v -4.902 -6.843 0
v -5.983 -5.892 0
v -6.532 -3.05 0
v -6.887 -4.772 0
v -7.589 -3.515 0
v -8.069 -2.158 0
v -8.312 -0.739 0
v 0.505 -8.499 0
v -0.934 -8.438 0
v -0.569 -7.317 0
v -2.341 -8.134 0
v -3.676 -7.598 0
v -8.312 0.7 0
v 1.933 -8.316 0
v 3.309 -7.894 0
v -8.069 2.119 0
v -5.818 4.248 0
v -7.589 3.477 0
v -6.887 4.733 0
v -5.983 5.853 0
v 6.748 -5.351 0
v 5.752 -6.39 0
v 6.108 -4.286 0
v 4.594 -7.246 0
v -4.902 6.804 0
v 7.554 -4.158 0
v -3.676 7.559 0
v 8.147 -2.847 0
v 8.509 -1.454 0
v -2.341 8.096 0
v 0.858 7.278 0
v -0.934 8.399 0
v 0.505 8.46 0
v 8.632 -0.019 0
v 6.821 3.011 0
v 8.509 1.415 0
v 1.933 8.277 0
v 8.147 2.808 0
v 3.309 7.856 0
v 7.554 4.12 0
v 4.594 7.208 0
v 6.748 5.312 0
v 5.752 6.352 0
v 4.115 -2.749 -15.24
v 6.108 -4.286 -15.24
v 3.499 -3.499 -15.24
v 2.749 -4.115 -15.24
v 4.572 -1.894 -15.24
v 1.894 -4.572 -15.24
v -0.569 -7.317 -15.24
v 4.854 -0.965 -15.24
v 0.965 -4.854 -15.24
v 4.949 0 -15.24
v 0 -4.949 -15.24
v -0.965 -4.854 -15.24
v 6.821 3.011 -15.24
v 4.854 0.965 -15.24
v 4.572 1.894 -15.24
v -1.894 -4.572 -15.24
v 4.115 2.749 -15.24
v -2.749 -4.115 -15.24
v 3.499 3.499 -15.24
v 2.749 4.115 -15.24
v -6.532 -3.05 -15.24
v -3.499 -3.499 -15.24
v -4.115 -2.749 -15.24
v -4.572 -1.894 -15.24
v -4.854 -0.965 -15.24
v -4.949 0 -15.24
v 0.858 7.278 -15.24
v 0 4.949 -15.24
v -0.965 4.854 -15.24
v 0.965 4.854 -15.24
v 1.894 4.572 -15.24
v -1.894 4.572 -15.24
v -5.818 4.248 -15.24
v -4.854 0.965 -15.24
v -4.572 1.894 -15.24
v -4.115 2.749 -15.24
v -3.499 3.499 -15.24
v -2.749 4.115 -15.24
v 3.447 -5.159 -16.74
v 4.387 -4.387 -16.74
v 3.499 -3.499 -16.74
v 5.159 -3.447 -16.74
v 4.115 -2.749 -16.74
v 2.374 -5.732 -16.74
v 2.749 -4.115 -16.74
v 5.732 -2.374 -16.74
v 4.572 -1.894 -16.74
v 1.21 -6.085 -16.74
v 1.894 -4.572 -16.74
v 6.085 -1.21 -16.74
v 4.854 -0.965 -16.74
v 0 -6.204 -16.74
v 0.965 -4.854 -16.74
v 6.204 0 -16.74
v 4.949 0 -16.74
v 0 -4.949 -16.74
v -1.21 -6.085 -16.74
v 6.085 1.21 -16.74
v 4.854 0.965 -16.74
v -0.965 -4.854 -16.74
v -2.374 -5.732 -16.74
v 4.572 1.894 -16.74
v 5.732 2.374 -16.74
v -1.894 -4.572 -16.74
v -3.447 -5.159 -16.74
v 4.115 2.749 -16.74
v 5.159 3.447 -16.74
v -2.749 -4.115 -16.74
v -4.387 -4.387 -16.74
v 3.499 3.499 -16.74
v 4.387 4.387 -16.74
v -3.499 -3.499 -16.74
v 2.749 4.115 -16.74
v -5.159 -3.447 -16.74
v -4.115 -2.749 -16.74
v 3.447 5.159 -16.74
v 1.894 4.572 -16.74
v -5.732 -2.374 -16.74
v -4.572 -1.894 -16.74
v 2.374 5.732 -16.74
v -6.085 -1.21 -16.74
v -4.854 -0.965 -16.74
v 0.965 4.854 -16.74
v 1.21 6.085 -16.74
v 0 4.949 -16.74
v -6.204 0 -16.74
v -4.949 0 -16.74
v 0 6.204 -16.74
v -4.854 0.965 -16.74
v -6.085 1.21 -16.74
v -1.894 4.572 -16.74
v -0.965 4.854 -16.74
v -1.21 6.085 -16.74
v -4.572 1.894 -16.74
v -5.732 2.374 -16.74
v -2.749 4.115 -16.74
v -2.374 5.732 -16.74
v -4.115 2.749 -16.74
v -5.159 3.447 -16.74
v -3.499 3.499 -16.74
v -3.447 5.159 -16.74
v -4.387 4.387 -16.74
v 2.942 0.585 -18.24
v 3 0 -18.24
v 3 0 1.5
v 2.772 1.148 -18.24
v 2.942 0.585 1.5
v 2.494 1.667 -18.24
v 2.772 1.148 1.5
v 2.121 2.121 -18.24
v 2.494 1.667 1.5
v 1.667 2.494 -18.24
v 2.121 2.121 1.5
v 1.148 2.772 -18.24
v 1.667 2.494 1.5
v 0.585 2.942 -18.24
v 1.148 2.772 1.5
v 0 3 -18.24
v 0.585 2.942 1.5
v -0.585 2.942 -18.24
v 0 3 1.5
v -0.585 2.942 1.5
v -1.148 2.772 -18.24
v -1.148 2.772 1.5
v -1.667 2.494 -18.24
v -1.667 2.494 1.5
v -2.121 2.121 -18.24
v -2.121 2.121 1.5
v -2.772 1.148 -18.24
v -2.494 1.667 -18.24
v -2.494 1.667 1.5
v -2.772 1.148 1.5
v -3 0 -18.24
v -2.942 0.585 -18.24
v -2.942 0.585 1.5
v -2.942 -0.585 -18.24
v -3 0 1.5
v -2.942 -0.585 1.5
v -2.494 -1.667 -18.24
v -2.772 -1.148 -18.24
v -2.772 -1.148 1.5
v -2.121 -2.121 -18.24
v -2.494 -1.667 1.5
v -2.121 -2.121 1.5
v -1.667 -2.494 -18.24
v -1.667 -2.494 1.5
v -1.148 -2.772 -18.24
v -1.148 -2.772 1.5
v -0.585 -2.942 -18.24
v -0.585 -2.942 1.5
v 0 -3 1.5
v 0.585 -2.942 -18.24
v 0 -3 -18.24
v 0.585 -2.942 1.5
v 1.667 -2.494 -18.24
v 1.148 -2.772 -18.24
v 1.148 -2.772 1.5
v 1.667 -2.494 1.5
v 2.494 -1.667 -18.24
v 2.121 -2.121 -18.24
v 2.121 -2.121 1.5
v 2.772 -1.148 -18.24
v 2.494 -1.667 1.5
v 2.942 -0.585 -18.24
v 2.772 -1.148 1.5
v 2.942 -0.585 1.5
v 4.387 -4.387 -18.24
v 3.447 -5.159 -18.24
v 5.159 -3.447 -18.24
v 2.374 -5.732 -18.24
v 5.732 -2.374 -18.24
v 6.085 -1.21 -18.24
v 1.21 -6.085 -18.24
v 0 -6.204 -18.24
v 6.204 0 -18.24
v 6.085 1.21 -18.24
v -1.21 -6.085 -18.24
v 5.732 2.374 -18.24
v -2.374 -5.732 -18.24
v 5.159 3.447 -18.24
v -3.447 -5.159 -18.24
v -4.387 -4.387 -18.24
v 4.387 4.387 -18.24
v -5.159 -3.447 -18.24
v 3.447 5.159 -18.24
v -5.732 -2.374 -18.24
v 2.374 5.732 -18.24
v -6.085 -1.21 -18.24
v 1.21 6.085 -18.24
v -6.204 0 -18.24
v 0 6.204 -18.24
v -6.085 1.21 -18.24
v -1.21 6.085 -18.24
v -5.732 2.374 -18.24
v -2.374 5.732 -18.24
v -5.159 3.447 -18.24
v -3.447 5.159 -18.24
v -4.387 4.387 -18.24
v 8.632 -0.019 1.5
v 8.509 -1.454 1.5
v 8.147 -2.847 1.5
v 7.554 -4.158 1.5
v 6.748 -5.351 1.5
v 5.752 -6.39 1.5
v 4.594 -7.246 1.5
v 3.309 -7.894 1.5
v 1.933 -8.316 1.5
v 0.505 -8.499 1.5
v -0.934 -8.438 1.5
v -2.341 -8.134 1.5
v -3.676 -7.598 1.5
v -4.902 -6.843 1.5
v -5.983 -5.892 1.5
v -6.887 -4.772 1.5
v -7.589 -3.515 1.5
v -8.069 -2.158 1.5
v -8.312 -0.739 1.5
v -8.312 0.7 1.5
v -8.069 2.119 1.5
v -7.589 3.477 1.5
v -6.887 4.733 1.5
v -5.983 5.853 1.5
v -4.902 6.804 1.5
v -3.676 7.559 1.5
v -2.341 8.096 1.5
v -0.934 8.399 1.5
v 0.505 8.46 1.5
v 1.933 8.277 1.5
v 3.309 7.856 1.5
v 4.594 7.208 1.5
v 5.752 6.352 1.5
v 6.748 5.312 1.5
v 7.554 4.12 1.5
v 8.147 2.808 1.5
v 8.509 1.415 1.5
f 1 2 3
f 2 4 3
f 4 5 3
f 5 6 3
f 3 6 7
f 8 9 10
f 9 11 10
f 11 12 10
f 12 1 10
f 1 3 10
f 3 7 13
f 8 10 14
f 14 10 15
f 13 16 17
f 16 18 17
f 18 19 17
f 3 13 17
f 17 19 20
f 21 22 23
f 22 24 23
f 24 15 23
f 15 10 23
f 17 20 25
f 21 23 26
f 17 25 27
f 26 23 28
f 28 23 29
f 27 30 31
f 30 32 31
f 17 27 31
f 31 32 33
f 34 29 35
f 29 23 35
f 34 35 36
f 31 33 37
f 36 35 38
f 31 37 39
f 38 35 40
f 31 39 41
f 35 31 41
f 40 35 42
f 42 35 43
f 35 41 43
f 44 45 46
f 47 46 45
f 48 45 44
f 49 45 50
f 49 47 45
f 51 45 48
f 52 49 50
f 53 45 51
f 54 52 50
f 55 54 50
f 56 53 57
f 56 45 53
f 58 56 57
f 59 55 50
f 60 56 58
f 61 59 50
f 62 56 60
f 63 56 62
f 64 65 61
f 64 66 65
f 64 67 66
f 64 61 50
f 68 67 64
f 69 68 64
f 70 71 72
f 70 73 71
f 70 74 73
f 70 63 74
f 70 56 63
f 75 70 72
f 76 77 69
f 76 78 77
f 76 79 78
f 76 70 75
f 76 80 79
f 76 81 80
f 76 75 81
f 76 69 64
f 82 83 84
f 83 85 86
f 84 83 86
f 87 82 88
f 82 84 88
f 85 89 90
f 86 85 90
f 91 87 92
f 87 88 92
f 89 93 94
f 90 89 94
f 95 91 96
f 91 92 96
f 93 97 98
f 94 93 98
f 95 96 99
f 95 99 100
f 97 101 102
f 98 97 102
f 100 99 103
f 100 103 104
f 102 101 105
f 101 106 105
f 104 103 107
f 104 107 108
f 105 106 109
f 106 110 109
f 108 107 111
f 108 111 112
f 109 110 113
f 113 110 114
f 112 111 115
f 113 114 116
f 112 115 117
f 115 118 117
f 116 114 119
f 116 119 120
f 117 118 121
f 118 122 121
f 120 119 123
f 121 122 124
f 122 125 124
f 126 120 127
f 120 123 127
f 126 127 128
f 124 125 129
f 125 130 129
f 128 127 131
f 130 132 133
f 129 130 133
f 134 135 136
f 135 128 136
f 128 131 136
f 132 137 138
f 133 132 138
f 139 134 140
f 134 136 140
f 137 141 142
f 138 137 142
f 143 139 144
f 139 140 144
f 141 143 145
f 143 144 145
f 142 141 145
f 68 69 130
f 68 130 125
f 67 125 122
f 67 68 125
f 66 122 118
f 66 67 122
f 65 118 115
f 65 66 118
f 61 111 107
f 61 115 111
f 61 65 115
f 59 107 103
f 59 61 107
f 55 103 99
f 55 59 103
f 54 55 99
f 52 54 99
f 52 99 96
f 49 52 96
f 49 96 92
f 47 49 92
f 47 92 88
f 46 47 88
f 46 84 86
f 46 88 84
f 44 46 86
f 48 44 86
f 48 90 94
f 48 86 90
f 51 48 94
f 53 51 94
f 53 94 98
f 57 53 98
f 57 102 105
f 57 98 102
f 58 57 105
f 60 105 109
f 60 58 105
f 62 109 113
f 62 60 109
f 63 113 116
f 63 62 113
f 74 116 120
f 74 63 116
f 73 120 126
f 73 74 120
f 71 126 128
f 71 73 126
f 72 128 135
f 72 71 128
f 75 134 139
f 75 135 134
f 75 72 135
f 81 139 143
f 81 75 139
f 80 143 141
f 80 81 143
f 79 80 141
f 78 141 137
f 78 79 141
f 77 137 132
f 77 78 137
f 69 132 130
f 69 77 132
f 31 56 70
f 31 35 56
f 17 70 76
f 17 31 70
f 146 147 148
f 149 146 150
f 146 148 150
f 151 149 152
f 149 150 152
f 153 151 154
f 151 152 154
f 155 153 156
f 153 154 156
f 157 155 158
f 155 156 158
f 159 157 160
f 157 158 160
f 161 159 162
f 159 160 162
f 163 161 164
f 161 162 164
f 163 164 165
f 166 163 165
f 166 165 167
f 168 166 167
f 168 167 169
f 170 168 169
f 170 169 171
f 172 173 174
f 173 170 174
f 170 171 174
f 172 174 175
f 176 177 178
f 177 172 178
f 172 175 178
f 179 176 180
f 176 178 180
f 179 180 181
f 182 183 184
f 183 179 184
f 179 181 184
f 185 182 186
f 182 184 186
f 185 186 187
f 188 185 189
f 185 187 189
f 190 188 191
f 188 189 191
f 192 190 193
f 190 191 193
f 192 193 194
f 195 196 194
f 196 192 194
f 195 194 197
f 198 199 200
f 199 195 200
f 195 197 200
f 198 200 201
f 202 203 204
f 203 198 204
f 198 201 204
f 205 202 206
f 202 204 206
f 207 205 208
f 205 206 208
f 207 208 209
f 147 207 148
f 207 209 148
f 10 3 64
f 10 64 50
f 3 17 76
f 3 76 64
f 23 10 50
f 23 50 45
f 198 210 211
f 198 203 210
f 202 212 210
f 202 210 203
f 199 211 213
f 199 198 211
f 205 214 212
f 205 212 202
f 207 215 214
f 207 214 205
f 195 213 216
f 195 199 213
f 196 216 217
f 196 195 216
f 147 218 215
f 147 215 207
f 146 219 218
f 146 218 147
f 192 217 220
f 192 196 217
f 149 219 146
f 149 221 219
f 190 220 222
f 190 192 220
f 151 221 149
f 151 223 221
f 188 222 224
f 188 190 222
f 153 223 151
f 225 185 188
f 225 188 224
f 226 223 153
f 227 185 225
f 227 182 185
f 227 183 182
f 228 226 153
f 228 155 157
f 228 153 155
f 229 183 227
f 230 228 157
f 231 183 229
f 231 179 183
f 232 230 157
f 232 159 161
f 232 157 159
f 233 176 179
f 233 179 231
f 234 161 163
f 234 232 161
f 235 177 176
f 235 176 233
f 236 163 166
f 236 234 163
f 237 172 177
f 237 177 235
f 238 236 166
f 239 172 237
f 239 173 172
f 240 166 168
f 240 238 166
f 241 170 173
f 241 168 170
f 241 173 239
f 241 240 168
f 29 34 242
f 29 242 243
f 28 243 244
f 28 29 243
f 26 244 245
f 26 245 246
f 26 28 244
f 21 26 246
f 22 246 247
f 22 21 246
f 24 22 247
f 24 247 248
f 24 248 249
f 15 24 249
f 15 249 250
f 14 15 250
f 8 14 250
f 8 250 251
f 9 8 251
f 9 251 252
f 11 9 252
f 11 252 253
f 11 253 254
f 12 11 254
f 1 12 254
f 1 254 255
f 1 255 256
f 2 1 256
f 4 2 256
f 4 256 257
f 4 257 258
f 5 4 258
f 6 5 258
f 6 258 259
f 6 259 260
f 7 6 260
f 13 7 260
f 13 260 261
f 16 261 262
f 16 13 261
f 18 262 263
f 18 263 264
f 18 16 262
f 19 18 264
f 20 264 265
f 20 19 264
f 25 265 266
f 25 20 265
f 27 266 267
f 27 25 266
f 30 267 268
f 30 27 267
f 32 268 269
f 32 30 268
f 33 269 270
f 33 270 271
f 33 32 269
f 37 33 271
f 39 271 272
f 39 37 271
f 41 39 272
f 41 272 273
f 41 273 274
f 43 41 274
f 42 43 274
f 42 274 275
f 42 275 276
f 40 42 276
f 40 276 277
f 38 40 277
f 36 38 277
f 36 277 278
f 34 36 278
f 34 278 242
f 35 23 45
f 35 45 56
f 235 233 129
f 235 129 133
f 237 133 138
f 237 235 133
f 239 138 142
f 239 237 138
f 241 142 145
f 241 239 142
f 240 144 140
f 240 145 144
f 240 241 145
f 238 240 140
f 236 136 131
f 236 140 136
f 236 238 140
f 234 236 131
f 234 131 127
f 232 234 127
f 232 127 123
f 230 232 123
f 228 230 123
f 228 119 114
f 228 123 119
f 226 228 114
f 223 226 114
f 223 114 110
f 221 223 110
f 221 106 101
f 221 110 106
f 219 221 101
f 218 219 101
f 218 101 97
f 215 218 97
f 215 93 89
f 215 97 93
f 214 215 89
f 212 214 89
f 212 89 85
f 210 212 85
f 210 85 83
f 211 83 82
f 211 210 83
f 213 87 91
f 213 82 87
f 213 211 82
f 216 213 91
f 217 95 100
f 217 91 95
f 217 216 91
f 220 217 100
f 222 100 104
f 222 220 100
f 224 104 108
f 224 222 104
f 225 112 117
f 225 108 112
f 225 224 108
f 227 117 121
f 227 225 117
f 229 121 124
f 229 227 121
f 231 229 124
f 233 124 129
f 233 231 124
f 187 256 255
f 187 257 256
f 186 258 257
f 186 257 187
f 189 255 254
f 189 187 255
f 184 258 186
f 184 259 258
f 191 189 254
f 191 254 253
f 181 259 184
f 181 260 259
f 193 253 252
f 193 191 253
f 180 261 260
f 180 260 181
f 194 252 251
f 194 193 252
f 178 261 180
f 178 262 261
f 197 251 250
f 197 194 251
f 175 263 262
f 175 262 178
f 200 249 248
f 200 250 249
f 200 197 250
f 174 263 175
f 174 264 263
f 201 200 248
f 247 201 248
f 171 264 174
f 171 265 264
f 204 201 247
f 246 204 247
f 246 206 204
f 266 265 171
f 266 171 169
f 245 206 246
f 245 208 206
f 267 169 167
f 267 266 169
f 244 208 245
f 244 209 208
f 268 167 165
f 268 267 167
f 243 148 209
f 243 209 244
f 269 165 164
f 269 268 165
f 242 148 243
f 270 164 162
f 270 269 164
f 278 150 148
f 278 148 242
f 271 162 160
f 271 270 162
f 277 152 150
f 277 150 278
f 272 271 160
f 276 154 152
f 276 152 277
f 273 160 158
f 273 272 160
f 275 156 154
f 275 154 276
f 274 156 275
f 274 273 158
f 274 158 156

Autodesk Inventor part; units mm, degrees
ref_plane "YZ Plane" through (0, 0, 0) normal (1, 0, 0) x (0, 1, 0)
ref_plane "XZ Plane" through (0, 0, 0) normal (0, 1, 0) x (-1, 0, 0)
sketch "Sketch1" plane through (0, 0, 0) normal (0, 0, 1) x (1, 0, 0)
  line L0 (-6.5322, -3.0499) -> (-5.8184, 4.2476) projected
  line L1 (-5.8184, 4.2476) -> (0.8584, 7.2782) projected
  line L2 (0.8584, 7.2782) -> (6.8213, 3.0112) projected
  line L3 (6.8213, 3.0112) -> (6.1075, -4.2863) projected
  line L4 (6.1075, -4.2863) -> (-0.5693, -7.3169) projected
  line L5 (-0.5693, -7.3169) -> (-6.5322, -3.0499) projected
  circle A0 centre (0.1445, -0.0193) radius 15.5 projected
  line L6 (-6.7574, 4.9196) -> (-7.5837, -3.5272)
  line L7 (-7.5837, -3.5272) -> (-0.6817, -8.4661)
  line L8 (-0.6817, -8.4661) -> (7.0465, -4.9582)
  line L9 (7.0465, -4.9582) -> (7.8727, 3.4885)
  line L10 (7.8727, 3.4885) -> (0.9708, 8.4274)
  line L11 (0.9708, 8.4274) -> (-6.7574, 4.9196)
  circle A1 centre (0.1445, -0.0193) radius 8.487
  point P0 (0, 0)
  dimension "d0" = 1
extrude "Extrusion1" add sketch "Sketch1" along normal blind 1.5 contours L0 L1 L2 L3 L4 L5 | L11 L10 L9 L8 L7 L6 | A1 L11 | L6 A1 | L7 A1 | A1 L10 | L8 A1 | A1 L9
sketch "Sketch2" plane through (0, 0, 0) normal (0, 0, -1) x (-1, 0, 0)
  line L0 (5.8184, 4.2476) -> (6.5322, -3.0499) projected
  line L1 (6.5322, -3.0499) -> (0.5693, -7.3169) projected
  line L2 (0.5693, -7.3169) -> (-6.1075, -4.2863) projected
  line L3 (-6.1075, -4.2863) -> (-6.8213, 3.0112) projected
  line L4 (-6.8213, 3.0112) -> (-0.8584, 7.2782) projected
  line L5 (-0.8584, 7.2782) -> (5.8184, 4.2476) projected
  circle A0 centre (-0.1445, -0.0193) radius 15.5 projected
  line L6 (5.8184, 4.2476) -> (6.5322, -3.0499) projected
  line L7 (6.5322, -3.0499) -> (0.5693, -7.3169) projected
  line L8 (0.5693, -7.3169) -> (-6.1075, -4.2863) projected
  line L9 (-6.1075, -4.2863) -> (-6.8213, 3.0112) projected
  line L10 (-6.8213, 3.0112) -> (-0.8584, 7.2782) projected
  line L11 (-0.8584, 7.2782) -> (5.8184, 4.2476) projected
  circle A1 centre (-0.1445, -0.0193) radius 15.5 projected
  point P0 (0, 0)
extrude "Extrusion2" add sketch "Sketch2" along normal blind 18.24 contours L0 L1 L2 L3 L4 L5
ref_plane "Work Plane1" through (0, 0, -15.24) normal (0, 0, -1) x (-1, 0, 0)
sketch "Sketch3" plane through (0, 0, -15.24) normal (0, 0, -1) x (-1, 0, 0)
  line L0 (5.8184, 4.2476) -> (6.5322, -3.0499) projected
  line L1 (-0.8584, 7.2782) -> (5.8184, 4.2476) projected
  line L2 (-6.8213, 3.0112) -> (-0.8584, 7.2782) projected
  line L3 (-6.1075, -4.2863) -> (-6.8213, 3.0112) projected
  line L4 (0.5693, -7.3169) -> (-6.1075, -4.2863) projected
  line L5 (6.5322, -3.0499) -> (0.5693, -7.3169) projected
  circle A0 centre (0, 0) radius 4.9486
  dimension "d17" = 9.8971
sketch "Sketch4" plane through (0, 0, 1.5) normal (0, 0, 1) x (1, 0, 0)
  circle A0 centre (0, 0) radius 3
  dimension "d8" = 6
extrude "Extrusion4" cut sketch "Sketch4" against normal through all
extrude "Extrusion6" cut sketch "Sketch3" along normal blind 1.5
sketch "Sketch6" plane through (0, 0, -18.24) normal (0, 0, -1) x (-1, 0, 0)
  circle A0 centre (0, 0) radius 3 projected
  line L0 (5.8184, 4.2476) -> (6.5322, -3.0499) projected
  line L1 (-0.8584, 7.2782) -> (5.8184, 4.2476) projected
  line L2 (-6.8213, 3.0112) -> (-0.8584, 7.2782) projected
  line L3 (-6.1075, -4.2863) -> (-6.8213, 3.0112) projected
  line L4 (0.5693, -7.3169) -> (-6.1075, -4.2863) projected
  line L5 (6.5322, -3.0499) -> (0.5693, -7.3169) projected
  circle A1 centre (0, 0) radius 6.2043
extrude "Extrusion7" cut sketch "Sketch6" against normal up to surface (1.5 mm away)
properties part number "Hub"
